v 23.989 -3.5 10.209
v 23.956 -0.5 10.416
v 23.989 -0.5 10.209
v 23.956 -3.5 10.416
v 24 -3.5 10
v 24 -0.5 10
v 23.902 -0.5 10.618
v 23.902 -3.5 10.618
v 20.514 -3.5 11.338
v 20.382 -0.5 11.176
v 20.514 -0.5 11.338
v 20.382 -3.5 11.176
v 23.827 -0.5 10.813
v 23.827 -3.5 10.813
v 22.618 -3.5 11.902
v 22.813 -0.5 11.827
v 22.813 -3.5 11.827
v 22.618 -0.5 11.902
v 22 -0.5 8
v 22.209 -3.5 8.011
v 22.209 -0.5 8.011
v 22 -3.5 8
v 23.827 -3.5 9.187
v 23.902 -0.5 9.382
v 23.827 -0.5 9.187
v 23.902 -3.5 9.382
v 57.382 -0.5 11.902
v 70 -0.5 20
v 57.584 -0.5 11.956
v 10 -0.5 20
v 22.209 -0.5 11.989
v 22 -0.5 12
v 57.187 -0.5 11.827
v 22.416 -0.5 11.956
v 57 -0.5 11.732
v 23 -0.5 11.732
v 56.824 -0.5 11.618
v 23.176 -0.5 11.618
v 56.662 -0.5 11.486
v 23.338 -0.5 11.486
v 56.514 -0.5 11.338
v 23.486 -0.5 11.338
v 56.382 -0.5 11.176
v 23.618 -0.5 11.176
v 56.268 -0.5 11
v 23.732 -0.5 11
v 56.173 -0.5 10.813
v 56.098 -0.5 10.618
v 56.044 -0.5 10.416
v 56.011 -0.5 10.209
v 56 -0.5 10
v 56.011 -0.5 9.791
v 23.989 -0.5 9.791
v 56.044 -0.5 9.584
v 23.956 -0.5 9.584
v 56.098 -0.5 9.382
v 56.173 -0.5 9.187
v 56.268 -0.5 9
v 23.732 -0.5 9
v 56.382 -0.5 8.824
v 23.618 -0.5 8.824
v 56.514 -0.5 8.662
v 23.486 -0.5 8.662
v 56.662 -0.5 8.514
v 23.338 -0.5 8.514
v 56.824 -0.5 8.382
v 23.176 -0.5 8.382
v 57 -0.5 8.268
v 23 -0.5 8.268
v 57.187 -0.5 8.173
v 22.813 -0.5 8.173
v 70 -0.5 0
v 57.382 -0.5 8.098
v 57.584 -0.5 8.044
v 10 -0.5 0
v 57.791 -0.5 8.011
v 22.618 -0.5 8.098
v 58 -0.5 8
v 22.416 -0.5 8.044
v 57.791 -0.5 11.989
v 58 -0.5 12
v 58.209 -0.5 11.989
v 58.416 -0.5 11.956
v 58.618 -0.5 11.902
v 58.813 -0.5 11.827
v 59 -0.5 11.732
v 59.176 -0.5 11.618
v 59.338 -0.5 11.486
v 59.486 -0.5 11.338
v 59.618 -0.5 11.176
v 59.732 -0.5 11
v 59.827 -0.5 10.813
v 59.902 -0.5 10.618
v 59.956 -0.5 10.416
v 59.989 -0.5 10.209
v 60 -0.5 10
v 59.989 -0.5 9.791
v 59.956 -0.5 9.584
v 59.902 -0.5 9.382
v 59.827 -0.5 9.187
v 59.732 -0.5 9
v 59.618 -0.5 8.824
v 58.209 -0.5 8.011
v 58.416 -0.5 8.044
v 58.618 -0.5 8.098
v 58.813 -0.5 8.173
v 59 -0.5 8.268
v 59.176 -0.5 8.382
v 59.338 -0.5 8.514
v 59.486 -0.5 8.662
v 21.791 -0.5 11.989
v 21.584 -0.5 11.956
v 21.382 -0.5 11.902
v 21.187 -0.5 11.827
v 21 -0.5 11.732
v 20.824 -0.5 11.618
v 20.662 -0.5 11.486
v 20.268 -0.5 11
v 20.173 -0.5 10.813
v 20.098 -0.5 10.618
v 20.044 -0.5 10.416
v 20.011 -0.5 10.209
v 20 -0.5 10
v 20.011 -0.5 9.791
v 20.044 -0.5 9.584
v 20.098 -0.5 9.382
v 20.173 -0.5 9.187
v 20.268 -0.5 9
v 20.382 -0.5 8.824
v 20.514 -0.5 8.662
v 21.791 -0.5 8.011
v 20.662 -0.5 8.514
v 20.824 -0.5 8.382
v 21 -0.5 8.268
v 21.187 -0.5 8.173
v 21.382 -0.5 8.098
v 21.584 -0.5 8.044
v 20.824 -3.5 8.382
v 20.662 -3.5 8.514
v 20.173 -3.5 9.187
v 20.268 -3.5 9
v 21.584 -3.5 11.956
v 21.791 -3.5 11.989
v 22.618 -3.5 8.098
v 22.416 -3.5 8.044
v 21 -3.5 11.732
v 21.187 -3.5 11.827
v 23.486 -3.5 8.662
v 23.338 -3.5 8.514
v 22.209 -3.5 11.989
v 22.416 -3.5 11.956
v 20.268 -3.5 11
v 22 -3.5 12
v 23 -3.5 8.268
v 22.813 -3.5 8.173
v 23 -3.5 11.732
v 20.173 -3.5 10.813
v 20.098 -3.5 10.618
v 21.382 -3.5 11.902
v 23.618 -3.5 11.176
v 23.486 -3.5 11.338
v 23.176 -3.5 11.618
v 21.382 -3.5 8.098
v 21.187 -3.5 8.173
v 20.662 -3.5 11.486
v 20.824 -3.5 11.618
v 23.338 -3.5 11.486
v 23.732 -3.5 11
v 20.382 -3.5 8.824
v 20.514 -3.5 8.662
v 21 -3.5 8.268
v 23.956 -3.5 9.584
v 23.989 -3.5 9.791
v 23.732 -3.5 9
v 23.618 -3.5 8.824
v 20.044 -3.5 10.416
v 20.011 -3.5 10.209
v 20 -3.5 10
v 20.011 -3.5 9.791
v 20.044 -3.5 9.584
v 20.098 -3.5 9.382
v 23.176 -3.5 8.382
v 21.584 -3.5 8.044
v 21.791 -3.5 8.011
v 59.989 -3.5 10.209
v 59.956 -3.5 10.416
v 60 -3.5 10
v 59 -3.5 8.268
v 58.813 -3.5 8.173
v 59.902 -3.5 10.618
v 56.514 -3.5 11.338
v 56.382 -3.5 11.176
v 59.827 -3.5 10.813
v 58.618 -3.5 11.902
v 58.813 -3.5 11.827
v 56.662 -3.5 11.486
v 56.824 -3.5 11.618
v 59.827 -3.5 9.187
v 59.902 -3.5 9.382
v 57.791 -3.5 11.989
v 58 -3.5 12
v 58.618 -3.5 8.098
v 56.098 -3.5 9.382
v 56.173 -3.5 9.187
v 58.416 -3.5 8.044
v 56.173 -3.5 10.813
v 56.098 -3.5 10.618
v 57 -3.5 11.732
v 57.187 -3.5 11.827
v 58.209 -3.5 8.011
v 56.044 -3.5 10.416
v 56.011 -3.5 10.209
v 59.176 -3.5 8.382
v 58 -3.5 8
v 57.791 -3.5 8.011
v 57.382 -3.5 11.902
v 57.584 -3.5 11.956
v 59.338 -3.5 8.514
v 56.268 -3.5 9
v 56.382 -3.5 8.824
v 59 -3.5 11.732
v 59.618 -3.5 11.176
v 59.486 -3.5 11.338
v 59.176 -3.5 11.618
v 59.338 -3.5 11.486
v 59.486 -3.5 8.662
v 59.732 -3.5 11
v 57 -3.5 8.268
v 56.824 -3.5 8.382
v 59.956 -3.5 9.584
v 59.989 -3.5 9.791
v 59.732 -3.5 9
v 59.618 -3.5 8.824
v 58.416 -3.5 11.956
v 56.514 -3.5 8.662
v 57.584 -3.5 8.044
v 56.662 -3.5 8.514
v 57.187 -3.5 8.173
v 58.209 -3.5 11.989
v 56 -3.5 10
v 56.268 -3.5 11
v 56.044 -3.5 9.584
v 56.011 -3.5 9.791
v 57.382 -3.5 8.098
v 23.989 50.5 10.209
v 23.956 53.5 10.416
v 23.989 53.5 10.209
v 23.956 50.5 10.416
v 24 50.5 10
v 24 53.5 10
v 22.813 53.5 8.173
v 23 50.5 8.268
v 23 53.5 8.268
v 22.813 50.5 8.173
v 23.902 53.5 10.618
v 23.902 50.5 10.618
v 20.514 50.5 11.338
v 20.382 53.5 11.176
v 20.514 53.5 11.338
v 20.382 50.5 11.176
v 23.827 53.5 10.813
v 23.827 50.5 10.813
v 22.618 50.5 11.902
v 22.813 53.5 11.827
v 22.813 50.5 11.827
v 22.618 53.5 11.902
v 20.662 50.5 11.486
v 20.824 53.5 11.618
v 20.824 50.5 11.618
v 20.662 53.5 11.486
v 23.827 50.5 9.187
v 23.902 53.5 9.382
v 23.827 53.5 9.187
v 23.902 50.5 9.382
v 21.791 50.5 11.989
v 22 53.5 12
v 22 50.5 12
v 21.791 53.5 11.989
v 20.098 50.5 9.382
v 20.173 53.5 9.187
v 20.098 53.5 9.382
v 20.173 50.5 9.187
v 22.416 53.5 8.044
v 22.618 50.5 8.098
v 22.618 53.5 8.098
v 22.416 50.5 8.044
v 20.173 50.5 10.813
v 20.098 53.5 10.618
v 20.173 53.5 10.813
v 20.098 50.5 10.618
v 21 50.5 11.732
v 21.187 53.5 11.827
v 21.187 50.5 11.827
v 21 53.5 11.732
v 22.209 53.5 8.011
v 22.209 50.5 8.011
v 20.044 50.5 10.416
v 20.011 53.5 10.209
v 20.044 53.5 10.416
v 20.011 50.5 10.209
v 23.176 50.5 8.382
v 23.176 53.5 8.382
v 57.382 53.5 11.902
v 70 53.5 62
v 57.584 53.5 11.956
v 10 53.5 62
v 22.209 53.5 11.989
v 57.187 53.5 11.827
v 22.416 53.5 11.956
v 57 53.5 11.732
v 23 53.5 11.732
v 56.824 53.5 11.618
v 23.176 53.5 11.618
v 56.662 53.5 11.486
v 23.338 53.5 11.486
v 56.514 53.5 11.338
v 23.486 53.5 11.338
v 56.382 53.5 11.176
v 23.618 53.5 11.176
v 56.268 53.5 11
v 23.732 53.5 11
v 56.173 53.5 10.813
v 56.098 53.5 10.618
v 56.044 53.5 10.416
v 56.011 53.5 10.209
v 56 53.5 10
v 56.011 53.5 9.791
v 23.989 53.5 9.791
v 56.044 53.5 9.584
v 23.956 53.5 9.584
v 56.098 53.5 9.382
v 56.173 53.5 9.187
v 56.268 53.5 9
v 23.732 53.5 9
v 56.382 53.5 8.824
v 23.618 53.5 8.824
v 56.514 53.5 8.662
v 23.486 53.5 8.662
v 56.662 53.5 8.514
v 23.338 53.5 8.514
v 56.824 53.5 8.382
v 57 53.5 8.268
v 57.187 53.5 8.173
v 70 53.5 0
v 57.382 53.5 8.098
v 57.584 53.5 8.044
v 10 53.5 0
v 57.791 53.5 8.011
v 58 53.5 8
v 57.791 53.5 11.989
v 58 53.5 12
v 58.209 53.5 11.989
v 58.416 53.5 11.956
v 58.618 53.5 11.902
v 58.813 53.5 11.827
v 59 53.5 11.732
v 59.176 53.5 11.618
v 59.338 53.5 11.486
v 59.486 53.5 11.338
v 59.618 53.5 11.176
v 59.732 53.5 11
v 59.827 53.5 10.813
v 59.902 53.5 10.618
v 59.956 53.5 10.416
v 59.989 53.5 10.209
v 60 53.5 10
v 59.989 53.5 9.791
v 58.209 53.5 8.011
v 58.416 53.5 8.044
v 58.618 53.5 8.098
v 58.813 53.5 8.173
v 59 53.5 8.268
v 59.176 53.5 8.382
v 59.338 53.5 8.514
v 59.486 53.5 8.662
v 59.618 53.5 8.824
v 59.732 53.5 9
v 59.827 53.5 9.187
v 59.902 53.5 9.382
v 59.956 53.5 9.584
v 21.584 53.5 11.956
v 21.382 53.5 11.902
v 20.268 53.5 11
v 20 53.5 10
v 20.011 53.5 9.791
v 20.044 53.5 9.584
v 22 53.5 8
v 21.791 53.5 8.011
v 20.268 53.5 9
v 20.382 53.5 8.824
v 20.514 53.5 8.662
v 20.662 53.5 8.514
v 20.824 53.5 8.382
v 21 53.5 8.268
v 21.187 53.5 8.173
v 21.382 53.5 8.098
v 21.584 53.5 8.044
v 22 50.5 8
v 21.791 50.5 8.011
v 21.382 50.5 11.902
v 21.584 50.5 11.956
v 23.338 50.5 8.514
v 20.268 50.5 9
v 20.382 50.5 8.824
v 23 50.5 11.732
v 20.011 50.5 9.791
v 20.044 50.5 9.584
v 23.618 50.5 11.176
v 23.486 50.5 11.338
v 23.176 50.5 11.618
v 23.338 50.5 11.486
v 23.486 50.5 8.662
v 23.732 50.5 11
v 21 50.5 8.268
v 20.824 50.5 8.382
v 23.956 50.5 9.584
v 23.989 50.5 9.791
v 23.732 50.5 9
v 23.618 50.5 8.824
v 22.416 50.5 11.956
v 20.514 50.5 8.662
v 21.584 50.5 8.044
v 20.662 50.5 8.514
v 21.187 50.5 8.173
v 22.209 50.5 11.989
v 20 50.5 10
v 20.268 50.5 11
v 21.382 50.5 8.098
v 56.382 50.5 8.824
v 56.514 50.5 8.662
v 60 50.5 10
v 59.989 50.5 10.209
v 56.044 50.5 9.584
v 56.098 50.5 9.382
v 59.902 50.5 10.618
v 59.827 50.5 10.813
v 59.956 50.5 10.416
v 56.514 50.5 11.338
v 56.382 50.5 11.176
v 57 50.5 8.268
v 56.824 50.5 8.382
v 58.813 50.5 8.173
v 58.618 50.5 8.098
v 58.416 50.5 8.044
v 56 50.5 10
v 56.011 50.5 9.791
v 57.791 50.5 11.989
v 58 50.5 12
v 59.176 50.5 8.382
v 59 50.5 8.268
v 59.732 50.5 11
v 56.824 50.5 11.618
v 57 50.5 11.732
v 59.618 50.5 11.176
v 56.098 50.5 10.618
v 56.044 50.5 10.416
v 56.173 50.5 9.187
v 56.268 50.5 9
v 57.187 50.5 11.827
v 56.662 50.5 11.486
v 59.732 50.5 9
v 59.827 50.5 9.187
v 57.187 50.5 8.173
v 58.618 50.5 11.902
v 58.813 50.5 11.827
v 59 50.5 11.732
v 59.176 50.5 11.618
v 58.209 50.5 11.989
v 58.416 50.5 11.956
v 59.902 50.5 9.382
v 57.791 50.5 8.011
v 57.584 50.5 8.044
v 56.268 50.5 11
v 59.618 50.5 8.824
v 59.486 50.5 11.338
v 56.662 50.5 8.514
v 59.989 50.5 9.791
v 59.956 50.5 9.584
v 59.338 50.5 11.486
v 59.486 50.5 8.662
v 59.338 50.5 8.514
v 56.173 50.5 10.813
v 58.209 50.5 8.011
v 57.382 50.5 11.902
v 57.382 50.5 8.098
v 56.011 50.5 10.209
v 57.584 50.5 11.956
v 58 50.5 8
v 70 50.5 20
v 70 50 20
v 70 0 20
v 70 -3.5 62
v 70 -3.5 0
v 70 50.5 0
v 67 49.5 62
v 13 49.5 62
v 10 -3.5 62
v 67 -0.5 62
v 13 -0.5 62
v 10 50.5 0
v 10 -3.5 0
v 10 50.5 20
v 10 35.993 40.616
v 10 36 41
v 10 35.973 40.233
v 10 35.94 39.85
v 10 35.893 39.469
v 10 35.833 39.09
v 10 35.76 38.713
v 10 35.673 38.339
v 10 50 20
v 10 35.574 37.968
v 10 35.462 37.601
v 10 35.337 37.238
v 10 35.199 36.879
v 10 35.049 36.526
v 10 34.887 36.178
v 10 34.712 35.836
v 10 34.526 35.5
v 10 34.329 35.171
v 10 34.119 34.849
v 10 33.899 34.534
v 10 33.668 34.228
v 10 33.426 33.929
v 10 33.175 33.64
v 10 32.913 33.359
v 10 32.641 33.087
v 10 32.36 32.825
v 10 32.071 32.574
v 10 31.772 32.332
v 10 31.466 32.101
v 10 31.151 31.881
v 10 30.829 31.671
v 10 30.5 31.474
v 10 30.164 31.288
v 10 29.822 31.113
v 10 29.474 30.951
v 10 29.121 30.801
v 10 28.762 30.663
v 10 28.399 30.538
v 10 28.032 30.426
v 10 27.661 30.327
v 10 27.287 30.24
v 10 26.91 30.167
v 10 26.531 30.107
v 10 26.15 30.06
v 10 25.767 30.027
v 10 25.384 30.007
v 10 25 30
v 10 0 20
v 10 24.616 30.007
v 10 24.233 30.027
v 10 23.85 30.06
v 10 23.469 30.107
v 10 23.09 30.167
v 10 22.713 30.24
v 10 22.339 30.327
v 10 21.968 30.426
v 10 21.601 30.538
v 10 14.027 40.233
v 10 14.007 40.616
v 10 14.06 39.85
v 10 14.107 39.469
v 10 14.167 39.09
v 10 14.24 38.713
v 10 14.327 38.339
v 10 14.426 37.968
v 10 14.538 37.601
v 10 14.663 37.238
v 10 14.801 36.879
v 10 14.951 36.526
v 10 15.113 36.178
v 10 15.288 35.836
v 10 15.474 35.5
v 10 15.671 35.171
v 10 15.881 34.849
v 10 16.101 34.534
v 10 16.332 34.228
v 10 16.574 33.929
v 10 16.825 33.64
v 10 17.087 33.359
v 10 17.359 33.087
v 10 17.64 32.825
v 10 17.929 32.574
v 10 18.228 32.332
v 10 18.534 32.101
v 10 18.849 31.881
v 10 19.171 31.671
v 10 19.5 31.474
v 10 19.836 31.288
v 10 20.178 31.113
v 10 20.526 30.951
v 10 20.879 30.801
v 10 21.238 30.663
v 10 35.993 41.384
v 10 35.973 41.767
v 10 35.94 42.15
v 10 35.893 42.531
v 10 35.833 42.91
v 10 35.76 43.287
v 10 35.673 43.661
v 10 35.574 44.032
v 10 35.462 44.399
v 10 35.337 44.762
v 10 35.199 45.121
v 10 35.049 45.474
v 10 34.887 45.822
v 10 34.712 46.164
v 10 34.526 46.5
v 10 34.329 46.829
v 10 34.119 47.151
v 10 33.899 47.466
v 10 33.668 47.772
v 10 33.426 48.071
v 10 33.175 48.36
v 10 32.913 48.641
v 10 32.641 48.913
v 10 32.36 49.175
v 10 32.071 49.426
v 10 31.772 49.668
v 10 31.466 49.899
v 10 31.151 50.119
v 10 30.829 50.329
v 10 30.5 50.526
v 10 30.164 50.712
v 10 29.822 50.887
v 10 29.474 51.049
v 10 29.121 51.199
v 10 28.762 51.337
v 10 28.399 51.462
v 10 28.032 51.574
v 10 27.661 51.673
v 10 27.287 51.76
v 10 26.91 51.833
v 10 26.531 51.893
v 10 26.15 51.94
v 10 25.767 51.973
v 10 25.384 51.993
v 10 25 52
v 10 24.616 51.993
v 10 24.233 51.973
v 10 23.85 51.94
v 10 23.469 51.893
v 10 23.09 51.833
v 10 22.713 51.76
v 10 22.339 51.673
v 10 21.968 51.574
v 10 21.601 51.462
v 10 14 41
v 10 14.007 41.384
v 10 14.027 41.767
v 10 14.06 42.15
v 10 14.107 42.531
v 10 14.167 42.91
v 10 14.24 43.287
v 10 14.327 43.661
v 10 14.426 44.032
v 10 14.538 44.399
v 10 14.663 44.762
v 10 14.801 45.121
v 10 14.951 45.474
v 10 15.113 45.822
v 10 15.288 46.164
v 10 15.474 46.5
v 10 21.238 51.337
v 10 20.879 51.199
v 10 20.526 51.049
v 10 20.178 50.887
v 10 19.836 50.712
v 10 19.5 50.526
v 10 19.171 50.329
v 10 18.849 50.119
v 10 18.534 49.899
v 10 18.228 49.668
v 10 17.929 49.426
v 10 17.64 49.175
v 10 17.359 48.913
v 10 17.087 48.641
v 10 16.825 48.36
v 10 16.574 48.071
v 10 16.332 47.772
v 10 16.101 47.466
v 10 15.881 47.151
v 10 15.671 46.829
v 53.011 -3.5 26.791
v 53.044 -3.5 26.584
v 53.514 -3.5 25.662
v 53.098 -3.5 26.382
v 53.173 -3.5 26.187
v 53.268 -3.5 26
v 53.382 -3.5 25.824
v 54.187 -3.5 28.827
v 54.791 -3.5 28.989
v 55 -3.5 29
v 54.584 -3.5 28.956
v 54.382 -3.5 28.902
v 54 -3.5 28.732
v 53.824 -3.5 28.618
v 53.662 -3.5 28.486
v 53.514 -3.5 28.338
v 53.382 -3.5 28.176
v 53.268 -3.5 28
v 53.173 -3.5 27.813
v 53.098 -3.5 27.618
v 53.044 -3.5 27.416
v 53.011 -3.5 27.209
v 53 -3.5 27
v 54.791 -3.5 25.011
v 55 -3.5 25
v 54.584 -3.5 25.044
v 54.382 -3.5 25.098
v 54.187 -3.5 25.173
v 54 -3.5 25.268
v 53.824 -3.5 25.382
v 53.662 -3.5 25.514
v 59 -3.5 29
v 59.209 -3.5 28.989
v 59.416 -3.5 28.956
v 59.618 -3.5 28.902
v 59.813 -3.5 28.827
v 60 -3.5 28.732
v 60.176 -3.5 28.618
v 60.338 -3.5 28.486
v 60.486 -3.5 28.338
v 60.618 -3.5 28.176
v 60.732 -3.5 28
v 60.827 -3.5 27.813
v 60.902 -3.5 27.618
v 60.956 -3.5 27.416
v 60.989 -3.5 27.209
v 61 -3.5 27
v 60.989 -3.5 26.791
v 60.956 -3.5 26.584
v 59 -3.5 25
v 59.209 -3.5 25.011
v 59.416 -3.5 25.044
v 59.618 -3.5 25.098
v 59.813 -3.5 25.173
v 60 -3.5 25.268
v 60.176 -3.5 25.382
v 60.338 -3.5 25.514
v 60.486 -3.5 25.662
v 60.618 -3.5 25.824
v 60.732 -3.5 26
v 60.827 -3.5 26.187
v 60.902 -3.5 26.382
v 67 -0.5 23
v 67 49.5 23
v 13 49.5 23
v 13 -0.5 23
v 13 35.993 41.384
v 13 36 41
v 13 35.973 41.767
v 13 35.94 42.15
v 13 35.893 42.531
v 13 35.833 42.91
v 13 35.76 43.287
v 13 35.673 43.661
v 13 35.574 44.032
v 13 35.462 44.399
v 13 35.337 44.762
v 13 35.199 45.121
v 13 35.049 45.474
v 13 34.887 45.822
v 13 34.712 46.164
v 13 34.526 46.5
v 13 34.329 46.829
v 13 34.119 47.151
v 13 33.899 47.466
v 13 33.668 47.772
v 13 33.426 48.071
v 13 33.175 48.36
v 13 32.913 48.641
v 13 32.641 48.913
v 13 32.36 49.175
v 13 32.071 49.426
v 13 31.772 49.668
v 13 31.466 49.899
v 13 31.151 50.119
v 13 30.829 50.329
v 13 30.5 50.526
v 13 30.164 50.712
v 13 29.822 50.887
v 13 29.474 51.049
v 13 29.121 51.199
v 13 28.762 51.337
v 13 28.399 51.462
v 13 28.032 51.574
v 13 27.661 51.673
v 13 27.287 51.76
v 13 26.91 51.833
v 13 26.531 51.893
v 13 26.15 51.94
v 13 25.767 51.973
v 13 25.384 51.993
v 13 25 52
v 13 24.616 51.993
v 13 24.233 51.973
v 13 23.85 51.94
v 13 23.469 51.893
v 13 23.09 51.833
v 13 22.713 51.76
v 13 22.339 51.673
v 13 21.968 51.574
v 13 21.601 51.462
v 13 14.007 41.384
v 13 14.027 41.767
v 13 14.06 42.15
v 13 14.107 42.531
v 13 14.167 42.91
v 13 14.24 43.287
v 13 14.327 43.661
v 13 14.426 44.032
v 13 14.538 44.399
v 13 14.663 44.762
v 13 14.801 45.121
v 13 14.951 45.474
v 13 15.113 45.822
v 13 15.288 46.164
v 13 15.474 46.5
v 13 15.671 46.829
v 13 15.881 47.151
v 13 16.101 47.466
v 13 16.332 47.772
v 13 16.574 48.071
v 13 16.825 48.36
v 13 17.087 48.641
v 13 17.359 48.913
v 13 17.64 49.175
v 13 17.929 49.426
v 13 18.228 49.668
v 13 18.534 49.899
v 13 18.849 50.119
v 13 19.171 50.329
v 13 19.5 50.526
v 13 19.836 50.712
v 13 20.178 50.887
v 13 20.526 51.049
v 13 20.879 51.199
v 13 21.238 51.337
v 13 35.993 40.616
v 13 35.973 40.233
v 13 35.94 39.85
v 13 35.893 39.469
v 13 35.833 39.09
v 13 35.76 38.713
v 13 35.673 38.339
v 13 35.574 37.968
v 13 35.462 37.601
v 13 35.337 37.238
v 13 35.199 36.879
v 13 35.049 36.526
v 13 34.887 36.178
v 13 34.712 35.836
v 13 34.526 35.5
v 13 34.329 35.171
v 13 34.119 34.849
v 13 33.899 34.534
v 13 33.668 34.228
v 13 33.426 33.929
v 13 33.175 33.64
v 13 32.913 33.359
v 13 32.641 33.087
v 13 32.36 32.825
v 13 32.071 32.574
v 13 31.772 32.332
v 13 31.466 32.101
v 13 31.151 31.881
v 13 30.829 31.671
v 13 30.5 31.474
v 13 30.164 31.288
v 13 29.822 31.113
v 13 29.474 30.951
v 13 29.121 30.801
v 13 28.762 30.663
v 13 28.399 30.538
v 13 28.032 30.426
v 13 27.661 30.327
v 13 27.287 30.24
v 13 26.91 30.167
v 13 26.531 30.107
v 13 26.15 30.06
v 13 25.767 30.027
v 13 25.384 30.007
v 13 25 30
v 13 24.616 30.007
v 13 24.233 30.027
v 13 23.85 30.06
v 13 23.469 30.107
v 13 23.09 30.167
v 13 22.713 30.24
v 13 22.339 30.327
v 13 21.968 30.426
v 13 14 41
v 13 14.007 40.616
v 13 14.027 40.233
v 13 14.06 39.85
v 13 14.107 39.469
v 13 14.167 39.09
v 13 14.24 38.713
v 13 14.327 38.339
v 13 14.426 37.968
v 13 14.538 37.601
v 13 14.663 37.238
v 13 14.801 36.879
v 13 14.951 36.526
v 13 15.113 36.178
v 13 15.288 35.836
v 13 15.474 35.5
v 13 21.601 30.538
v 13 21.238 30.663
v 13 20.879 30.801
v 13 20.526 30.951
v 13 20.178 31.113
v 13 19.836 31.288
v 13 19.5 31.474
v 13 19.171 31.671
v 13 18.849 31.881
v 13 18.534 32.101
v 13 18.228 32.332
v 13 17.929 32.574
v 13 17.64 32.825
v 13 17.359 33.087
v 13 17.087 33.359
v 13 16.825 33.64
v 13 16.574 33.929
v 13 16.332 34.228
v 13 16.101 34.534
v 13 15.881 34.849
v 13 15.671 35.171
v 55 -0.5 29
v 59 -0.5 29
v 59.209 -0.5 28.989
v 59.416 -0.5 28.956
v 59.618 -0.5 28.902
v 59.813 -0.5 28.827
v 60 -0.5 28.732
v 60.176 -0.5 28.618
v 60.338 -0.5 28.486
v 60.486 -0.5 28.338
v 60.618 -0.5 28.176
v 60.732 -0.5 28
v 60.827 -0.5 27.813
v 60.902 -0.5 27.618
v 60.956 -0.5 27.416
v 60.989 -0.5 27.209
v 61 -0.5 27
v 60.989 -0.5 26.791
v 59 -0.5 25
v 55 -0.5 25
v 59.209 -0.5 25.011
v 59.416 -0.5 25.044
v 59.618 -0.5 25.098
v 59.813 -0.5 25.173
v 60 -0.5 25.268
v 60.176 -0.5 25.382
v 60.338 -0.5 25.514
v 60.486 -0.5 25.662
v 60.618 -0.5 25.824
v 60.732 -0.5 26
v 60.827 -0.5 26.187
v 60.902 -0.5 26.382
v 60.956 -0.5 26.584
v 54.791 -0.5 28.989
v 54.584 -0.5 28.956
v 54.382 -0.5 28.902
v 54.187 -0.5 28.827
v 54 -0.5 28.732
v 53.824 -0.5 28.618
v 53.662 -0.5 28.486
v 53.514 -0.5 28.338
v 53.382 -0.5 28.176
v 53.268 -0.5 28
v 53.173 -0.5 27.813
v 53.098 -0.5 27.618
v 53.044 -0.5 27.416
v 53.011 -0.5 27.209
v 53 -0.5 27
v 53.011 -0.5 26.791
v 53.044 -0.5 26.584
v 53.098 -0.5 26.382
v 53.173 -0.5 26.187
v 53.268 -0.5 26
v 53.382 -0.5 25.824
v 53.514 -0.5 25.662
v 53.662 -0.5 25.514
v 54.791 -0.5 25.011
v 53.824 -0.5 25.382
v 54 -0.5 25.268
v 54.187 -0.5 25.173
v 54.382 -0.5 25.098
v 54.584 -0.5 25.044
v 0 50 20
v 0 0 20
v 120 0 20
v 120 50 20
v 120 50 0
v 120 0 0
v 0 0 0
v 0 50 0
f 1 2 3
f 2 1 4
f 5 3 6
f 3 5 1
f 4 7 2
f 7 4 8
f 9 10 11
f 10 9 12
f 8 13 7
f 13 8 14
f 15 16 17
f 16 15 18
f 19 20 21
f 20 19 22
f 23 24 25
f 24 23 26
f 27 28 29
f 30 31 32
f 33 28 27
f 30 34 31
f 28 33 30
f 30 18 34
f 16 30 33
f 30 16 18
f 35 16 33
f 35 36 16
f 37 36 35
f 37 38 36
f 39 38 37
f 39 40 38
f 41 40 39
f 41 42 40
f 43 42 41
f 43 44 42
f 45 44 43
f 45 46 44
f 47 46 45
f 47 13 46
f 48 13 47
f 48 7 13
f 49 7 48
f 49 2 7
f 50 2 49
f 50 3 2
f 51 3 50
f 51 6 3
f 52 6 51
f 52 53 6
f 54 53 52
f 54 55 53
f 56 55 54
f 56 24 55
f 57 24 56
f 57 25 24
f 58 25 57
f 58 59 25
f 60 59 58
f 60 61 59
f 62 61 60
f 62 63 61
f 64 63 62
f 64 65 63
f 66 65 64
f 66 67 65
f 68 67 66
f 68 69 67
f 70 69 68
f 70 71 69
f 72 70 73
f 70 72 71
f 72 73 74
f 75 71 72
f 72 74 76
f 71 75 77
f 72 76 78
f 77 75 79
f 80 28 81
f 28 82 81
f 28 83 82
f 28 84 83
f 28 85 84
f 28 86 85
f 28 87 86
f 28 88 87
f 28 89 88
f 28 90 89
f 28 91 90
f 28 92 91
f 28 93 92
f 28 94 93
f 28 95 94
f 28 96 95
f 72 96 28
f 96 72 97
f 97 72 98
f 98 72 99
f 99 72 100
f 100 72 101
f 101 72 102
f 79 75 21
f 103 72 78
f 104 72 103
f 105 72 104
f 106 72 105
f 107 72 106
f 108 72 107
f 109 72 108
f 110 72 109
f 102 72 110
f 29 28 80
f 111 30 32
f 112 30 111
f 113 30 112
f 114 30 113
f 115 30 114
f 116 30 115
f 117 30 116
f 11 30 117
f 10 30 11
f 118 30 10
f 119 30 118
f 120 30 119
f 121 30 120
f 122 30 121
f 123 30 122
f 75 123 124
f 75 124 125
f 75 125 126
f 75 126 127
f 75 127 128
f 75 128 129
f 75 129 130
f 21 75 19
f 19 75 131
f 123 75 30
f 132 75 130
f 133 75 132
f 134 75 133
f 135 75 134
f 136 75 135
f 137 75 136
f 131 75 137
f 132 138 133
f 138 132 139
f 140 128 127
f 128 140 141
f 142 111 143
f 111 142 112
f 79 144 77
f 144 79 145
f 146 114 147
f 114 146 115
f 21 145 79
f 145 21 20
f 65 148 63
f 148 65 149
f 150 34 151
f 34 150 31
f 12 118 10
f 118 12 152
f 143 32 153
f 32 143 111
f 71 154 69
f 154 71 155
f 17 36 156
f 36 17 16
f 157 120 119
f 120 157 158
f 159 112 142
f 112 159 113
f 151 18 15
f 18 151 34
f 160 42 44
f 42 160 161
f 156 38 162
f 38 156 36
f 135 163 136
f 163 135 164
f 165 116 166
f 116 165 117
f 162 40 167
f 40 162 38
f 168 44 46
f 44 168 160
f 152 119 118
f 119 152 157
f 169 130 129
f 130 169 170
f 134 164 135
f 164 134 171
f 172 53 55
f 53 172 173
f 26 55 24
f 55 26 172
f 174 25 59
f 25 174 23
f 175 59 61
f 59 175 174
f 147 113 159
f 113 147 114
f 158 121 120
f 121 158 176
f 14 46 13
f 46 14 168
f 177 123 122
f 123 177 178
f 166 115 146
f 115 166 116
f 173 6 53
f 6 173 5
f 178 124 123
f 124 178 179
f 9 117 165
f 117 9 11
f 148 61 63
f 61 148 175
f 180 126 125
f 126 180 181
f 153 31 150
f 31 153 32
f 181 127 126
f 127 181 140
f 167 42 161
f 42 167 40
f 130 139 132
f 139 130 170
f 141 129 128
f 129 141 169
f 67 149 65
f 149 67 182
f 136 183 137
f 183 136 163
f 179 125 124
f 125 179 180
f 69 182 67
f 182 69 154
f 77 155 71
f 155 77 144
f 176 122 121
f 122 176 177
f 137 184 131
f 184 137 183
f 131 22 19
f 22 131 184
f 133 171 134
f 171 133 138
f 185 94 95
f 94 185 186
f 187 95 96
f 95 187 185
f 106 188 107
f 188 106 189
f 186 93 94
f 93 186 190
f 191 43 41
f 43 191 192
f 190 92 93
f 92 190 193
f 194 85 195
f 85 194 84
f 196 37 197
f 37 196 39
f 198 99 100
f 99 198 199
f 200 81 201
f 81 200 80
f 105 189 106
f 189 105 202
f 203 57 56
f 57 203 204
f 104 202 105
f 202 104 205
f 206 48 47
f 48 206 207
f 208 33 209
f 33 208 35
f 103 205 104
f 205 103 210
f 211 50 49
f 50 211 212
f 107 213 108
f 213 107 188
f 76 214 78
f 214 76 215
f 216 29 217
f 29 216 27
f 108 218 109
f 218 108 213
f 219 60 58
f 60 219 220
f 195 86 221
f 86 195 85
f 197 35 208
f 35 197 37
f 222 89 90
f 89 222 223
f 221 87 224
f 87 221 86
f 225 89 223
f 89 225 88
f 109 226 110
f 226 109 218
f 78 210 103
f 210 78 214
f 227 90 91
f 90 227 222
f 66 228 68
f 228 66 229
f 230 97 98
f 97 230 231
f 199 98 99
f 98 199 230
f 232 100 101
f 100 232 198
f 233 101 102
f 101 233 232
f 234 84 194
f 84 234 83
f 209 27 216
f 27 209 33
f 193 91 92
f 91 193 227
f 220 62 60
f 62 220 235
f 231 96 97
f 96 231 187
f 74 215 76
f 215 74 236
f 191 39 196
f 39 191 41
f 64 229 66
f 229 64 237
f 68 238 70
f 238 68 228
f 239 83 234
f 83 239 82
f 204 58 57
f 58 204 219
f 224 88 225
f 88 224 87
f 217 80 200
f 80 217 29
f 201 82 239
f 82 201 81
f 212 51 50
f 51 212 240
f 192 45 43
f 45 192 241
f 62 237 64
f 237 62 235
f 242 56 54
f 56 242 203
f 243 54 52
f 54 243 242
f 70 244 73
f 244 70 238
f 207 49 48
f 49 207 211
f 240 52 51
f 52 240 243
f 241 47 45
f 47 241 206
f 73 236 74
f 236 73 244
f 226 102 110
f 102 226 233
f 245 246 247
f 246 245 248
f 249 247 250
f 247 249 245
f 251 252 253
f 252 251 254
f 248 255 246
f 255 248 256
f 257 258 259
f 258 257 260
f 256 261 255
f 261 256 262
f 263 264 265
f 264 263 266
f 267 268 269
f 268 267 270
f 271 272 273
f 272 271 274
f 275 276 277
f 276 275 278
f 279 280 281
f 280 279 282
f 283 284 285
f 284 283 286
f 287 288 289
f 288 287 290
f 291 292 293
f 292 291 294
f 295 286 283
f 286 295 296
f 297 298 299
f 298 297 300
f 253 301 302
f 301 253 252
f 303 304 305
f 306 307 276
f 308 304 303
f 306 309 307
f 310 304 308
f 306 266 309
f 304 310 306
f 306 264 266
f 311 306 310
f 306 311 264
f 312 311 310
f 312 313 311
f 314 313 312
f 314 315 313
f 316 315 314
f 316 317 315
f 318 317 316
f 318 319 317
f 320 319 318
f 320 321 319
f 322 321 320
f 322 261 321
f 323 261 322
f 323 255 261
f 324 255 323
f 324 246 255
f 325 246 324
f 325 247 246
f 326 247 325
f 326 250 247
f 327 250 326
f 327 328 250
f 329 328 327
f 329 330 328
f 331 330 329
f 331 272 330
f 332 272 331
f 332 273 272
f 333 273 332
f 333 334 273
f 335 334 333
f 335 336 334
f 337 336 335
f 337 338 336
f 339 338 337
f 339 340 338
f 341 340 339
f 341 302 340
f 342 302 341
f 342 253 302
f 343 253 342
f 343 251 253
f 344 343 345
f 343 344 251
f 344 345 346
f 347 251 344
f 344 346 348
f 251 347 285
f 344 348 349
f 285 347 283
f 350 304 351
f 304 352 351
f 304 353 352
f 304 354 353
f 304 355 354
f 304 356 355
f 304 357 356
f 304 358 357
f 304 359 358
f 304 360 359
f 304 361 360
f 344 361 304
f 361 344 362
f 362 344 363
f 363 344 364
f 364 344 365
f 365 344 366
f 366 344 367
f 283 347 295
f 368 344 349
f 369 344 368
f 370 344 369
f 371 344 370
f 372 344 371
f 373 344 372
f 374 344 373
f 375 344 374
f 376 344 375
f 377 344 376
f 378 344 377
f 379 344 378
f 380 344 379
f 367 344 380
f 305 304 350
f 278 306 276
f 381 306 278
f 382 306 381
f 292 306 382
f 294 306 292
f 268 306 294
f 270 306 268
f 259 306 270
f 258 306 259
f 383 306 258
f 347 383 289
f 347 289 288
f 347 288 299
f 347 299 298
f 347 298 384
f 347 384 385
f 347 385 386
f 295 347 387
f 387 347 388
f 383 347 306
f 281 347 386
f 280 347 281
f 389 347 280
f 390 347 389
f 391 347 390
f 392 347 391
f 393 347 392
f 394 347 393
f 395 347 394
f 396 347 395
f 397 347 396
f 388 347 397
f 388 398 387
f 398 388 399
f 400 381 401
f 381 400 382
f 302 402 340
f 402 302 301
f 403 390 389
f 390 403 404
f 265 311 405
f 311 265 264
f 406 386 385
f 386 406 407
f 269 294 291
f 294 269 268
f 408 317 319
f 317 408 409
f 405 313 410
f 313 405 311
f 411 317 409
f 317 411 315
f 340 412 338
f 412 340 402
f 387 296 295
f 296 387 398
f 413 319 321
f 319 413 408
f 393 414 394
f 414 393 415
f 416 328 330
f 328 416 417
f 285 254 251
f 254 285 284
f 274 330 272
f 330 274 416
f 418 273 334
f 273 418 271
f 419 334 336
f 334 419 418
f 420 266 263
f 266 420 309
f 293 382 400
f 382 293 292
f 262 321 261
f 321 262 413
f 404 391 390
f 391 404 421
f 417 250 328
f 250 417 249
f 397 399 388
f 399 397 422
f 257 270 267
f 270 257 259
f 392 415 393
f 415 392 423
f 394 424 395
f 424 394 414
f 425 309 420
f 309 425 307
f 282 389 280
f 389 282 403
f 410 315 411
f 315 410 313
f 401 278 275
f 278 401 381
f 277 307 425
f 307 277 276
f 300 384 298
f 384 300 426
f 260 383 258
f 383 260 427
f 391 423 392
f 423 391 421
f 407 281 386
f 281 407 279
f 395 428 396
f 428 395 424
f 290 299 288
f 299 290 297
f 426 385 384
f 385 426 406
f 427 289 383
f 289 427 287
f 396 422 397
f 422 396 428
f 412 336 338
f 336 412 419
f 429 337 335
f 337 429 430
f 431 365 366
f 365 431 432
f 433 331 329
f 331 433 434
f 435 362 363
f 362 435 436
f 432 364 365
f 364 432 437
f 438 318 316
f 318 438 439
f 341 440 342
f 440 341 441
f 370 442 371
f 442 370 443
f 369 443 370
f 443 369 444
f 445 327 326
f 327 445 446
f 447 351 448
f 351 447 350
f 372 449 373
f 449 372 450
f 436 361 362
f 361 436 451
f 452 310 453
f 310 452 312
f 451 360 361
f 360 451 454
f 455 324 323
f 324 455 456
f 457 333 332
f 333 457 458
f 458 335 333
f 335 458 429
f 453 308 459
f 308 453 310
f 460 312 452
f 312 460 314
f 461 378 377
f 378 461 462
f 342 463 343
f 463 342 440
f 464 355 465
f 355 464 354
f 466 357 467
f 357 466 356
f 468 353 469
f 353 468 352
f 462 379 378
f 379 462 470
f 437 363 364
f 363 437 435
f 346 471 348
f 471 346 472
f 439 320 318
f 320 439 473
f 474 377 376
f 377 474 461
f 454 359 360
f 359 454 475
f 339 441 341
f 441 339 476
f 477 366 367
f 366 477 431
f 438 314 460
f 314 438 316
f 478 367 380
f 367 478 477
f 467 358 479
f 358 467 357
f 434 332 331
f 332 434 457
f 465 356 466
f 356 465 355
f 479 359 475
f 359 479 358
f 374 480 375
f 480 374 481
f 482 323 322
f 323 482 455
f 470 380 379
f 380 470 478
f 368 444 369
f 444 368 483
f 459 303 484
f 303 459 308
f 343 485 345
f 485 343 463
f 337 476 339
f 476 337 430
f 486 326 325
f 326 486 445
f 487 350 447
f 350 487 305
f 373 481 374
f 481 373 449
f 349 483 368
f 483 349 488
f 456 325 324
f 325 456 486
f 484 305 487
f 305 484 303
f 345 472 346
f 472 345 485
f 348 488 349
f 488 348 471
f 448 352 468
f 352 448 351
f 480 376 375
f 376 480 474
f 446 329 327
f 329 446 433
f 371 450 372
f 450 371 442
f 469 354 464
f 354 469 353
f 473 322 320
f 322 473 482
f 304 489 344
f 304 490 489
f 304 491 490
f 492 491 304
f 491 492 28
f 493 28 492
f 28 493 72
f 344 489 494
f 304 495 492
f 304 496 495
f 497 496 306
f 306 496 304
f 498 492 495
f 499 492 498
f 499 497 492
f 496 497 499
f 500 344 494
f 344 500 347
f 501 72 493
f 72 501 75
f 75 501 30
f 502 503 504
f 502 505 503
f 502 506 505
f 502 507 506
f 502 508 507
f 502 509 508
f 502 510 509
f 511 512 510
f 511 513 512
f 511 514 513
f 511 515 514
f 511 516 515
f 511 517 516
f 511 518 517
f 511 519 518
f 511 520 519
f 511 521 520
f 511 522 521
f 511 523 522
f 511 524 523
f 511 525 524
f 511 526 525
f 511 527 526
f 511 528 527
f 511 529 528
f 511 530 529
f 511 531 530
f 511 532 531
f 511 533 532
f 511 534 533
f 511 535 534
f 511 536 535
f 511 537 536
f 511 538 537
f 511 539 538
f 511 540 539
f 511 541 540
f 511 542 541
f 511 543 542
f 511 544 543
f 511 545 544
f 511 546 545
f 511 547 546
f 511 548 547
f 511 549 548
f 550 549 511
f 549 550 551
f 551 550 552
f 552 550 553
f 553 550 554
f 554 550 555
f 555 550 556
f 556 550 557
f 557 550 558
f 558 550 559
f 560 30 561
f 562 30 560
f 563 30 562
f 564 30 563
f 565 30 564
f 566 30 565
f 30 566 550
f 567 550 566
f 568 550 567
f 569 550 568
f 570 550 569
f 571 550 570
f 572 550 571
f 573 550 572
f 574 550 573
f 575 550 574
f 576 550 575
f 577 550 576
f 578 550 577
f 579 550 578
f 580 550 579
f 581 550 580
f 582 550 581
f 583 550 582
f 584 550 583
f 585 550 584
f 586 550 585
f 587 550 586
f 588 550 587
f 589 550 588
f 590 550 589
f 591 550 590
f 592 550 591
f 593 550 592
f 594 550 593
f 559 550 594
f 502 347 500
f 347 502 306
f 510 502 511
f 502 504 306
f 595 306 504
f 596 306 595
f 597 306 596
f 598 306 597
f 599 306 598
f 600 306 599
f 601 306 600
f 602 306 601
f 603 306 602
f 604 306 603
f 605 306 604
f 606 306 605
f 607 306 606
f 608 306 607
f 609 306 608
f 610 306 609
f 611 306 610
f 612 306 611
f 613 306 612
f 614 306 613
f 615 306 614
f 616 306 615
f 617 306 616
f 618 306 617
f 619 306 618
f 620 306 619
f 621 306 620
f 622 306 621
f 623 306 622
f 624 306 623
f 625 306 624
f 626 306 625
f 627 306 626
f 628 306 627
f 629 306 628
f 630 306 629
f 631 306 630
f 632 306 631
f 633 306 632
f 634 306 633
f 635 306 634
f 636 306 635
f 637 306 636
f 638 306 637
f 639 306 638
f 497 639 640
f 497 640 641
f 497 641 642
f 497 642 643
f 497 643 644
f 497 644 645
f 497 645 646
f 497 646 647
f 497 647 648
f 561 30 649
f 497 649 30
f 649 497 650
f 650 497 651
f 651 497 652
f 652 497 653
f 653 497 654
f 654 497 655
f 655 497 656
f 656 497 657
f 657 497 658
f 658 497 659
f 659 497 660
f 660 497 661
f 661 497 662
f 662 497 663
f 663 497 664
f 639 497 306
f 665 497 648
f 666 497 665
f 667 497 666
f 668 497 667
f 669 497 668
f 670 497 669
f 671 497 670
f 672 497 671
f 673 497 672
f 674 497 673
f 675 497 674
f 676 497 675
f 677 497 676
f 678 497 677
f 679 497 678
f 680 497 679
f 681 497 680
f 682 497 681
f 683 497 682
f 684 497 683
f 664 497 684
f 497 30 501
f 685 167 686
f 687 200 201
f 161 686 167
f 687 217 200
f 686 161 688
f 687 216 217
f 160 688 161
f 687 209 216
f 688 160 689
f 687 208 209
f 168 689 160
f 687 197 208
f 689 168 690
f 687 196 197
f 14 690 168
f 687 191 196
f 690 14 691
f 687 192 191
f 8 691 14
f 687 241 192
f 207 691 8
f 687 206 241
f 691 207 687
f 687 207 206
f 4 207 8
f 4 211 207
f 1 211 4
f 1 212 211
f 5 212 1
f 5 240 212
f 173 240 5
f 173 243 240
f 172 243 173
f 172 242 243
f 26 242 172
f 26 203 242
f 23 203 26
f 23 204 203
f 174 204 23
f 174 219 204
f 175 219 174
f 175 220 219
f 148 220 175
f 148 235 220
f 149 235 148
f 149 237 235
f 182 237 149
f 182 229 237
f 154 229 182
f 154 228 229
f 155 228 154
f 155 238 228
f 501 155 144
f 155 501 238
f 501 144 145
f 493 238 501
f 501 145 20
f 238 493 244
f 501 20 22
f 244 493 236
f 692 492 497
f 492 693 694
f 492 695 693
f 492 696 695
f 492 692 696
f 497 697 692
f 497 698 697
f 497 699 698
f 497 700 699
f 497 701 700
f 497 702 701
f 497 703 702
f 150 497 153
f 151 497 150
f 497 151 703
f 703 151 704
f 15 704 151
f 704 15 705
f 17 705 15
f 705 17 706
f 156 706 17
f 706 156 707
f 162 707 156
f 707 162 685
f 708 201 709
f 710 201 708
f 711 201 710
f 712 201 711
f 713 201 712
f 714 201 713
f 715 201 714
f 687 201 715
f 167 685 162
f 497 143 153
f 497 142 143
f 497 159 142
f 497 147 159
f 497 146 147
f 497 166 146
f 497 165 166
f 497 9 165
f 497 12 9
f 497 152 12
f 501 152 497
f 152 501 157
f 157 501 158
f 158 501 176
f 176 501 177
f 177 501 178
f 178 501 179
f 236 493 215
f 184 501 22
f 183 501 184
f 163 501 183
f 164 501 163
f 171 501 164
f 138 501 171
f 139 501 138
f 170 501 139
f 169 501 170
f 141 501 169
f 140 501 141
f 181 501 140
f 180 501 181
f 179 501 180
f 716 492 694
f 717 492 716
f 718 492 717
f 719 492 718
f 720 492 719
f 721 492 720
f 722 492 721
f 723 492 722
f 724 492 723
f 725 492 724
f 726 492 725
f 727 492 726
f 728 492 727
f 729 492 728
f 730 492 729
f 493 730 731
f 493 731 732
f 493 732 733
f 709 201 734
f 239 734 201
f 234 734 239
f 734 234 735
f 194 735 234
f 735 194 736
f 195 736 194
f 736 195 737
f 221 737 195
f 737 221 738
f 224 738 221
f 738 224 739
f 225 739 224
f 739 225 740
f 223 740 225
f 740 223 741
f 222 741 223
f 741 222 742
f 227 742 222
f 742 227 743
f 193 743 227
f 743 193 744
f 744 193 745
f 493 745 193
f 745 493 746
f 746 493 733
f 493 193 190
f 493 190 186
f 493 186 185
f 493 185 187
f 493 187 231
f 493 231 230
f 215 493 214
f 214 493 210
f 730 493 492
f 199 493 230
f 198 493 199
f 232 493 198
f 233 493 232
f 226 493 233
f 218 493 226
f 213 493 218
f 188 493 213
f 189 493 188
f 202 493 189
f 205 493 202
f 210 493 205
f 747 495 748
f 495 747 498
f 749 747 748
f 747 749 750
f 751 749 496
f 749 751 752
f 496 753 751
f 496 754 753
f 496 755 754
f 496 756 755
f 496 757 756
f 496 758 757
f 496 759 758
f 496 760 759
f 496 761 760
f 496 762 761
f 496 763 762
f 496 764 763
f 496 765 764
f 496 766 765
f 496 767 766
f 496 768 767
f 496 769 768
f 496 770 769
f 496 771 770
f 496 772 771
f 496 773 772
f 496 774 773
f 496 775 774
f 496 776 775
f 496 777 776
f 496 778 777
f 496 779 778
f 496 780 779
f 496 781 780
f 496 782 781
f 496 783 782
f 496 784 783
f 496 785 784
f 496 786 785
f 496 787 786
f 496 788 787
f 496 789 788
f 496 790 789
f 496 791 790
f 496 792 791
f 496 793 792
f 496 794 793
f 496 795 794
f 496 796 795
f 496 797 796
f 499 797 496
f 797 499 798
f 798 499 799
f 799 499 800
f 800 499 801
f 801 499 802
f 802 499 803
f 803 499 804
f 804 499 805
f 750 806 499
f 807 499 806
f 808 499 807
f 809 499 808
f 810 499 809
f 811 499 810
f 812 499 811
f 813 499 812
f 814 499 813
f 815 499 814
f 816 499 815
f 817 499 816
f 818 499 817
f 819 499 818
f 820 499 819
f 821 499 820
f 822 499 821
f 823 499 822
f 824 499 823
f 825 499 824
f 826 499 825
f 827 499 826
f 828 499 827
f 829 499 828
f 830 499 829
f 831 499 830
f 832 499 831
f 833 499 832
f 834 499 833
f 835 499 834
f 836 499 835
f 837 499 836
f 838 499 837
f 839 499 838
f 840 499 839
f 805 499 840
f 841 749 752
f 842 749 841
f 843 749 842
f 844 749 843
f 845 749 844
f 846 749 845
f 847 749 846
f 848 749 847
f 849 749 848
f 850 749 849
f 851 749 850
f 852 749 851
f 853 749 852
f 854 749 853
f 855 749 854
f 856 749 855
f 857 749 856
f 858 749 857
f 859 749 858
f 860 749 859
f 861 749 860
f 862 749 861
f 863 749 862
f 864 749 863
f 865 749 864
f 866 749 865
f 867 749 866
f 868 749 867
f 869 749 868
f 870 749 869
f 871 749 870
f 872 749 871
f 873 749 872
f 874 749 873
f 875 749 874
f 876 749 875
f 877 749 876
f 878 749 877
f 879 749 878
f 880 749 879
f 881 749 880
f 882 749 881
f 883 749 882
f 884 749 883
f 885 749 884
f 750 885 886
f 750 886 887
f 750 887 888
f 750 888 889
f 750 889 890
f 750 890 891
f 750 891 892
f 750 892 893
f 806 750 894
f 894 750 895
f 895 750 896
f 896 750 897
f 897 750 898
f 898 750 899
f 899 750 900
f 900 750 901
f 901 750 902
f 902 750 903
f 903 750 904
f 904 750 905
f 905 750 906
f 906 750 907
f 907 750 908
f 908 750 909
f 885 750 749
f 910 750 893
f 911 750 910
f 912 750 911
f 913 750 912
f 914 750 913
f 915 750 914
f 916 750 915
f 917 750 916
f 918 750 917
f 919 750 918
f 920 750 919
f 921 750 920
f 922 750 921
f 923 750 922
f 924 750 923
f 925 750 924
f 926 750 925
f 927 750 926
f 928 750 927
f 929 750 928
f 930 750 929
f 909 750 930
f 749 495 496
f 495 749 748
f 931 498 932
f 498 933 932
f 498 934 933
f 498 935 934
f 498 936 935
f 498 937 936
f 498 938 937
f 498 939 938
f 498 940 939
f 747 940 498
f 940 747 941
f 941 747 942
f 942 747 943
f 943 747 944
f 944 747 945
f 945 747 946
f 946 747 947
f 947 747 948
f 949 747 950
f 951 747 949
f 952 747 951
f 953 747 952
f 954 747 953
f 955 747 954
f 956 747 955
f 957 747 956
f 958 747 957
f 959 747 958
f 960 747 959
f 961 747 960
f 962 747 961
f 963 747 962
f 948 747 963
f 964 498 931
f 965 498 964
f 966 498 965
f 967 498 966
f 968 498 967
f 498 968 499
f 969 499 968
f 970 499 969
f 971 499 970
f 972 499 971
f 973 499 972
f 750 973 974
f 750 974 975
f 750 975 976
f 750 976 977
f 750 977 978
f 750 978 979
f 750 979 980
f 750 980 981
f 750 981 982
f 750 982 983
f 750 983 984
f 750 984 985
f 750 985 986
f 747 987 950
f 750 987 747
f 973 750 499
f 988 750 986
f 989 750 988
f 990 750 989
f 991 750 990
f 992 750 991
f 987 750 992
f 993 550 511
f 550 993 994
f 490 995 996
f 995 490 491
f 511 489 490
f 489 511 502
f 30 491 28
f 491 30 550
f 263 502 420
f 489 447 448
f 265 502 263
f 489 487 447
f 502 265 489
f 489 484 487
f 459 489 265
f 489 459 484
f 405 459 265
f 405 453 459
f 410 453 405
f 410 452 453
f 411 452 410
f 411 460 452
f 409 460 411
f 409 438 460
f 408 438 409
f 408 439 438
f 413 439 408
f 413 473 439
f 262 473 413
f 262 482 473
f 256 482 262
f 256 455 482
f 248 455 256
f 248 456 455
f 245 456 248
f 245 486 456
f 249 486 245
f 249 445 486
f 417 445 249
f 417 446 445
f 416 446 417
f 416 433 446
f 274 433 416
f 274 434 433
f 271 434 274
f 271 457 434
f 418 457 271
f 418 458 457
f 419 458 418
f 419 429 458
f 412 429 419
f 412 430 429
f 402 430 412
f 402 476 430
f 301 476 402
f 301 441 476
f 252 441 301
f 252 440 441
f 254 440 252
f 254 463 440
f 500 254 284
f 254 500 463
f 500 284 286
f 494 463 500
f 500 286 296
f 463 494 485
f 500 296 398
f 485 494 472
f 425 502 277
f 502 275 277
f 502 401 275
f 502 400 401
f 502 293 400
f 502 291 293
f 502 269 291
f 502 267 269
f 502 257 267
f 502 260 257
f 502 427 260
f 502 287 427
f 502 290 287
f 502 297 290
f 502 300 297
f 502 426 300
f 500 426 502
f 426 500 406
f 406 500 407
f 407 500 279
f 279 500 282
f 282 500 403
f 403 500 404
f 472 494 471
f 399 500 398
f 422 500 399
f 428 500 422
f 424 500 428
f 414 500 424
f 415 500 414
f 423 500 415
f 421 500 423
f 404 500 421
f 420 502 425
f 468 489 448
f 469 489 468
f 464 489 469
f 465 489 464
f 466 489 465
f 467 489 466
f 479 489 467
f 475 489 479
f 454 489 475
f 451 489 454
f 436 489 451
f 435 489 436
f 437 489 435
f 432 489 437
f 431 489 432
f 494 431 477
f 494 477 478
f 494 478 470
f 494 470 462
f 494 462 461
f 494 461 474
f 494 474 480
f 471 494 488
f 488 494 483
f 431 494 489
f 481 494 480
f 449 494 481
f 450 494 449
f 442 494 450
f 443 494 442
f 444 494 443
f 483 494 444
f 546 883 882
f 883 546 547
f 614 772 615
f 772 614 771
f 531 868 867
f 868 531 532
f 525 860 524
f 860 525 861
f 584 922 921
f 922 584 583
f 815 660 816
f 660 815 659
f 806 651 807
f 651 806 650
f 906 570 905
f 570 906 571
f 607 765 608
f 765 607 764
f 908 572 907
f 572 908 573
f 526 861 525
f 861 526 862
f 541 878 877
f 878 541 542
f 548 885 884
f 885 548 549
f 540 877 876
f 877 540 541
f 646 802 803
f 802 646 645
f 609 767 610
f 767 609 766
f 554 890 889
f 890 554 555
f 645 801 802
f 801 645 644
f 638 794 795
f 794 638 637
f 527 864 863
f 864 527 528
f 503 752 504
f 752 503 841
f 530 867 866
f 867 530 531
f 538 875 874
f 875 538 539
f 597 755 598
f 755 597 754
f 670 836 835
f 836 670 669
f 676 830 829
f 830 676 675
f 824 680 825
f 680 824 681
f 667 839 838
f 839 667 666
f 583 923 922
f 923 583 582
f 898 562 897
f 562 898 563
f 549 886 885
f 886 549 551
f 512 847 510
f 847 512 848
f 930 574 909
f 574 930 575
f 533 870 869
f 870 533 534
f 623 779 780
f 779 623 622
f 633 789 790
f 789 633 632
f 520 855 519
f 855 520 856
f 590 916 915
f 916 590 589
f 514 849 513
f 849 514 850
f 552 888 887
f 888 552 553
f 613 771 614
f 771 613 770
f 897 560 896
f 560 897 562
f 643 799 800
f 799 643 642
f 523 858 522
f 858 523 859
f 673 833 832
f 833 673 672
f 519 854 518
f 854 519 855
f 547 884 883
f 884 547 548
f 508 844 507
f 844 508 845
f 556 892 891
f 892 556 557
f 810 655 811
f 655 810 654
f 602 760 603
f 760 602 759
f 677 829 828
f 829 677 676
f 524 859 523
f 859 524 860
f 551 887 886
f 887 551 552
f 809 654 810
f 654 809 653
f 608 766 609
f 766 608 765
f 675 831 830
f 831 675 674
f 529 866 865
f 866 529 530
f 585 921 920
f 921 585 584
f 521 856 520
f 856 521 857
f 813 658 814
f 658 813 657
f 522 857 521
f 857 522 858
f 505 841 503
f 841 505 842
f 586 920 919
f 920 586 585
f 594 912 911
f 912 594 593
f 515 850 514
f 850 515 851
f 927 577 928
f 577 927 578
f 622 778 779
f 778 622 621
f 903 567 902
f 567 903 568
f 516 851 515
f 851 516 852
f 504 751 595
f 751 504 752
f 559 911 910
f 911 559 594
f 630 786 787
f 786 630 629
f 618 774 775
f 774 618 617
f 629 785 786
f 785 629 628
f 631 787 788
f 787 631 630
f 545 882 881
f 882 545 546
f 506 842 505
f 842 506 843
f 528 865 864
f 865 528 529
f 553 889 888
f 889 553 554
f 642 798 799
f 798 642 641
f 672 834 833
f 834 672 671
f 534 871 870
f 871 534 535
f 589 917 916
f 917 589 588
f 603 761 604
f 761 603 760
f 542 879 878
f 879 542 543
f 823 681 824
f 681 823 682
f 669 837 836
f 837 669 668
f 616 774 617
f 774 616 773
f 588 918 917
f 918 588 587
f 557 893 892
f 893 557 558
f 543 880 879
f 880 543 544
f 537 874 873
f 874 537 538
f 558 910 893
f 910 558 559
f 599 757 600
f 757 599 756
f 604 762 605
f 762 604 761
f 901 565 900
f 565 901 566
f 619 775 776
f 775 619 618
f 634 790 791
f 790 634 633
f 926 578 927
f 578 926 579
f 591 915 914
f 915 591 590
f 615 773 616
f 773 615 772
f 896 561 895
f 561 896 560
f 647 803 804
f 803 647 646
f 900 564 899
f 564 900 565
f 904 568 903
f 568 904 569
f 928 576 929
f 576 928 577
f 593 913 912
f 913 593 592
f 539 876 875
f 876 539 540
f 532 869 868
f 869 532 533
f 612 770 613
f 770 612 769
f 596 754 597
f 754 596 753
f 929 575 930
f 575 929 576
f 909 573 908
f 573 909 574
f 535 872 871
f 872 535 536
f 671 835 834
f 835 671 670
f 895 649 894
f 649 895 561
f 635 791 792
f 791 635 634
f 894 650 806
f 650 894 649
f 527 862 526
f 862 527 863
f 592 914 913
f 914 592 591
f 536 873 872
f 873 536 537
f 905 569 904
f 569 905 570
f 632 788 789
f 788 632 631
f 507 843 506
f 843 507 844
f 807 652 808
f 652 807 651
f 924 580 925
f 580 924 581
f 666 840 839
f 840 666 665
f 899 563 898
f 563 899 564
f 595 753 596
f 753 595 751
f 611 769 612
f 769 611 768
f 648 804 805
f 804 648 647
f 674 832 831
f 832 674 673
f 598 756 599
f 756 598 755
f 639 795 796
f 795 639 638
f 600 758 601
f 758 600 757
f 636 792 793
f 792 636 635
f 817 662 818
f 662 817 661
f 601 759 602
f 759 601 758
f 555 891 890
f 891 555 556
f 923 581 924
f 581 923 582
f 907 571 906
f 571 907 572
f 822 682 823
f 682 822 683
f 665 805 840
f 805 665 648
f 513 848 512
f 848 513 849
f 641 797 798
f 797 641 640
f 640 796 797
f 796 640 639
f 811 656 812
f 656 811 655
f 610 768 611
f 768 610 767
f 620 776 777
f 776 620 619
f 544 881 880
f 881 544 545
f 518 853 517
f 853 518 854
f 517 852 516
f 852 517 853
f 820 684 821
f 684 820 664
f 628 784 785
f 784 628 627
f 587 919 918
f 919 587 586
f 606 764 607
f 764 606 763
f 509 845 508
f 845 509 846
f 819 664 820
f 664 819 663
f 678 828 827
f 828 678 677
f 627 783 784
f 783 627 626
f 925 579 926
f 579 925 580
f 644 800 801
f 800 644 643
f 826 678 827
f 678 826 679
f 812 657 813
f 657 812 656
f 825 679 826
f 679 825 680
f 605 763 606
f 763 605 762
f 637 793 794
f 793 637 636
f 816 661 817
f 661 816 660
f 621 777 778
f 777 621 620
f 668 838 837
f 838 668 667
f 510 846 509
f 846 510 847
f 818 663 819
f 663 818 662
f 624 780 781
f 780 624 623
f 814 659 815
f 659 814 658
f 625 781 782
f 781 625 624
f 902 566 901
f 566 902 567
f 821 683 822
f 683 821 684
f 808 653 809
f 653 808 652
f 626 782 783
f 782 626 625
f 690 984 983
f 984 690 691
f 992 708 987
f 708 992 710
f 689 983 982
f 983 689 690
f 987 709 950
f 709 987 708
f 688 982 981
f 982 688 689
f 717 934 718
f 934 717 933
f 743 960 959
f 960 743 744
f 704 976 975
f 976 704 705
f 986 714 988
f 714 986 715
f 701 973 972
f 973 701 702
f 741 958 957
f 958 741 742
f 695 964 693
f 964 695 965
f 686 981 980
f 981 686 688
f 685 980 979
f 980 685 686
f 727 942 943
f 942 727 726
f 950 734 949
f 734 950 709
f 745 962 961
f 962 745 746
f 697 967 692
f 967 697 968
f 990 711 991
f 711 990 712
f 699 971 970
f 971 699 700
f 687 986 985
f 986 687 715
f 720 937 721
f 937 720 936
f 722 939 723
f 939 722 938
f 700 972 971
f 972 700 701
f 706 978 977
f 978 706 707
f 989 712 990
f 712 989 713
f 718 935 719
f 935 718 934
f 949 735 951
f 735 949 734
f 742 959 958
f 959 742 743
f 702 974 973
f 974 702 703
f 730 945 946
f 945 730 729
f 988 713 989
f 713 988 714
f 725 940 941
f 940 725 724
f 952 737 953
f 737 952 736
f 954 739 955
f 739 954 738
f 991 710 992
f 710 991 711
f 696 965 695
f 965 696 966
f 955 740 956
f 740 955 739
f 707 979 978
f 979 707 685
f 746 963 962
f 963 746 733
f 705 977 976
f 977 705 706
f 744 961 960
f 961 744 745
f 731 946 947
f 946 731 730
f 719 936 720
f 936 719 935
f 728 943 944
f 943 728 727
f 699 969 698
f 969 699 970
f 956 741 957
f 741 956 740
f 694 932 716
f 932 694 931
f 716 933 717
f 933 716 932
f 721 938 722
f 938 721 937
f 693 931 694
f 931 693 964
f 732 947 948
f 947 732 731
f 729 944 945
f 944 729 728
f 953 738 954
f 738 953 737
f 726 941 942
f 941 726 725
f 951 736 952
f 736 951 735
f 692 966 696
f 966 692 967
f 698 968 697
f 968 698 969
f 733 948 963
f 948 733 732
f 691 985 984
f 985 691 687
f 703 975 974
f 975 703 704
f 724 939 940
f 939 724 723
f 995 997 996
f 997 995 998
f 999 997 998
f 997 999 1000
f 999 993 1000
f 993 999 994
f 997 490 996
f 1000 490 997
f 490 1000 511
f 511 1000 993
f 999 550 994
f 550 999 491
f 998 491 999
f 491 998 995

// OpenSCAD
rail_width = 50;
rail_height = 20;
rail_length = 120;
rail_tolerance = 0.5;
wall_thickness = 3;
box_length = 60;
box_height = 42;
button_hole_diameter = 22;
screw_hole_diameter = 4;
screw_hole_offset = 12;
cable_hole_diameter = 4;
cable_hole_offset = 4;
lid_tolerance = 0.2;

module box_outer(){
    cube([
        box_length,
        rail_width + wall_thickness * 2 + rail_tolerance * 2,
        box_height + rail_height
    ]);
}

module rail_cutout(){
    translate([0, wall_thickness, 0]){
        cube([
            box_length,
            rail_width + rail_tolerance * 2,
            rail_height,
        ]);
    }
}

module box_inner_cutout(){
    translate([wall_thickness, wall_thickness, rail_height + wall_thickness]){
        cube([box_length - wall_thickness * 2, rail_width, box_height - wall_thickness]);
    }
}

module button_hole_cutout(){
    translate([0, rail_width / 2 + wall_thickness + rail_tolerance, rail_height + box_height / 2]){
        rotate([0, 90, 0]){
            cylinder(d=button_hole_diameter, h=wall_thickness, center=false, $fn=180);
        }
    }
}

module screw_hole(){
    translate([0, wall_thickness, 0]){
        rotate([90, 0, 0]){
            cylinder(d=screw_hole_diameter, h=wall_thickness + rail_tolerance, center=false, $fn=60);
        }
    }
}

module cable_hole(){
    translate([box_length - wall_thickness - cable_hole_offset - cable_hole_diameter * 2, 0, rail_height + wall_thickness + cable_hole_offset]){
        hull(){
            translate([0, wall_thickness, 0]){
                rotate([90, 0, 0]){
                    cylinder(d=screw_hole_diameter, h=wall_thickness + rail_tolerance, center=false, $fn=60);
                }
            }
            translate([cable_hole_diameter, wall_thickness, 0]){
                rotate([90, 0, 0]){
                    cylinder(d=screw_hole_diameter, h=wall_thickness + rail_tolerance, center=false, $fn=60);
                }
            }
        }
    }
}

module screw_holes(){
    translate([screw_hole_offset, 0, rail_height / 2]){
        screw_hole();
    }
    translate([box_length - screw_hole_offset, 0, rail_height / 2]){
        screw_hole();
    }
    translate([screw_hole_offset, rail_width + wall_thickness + rail_tolerance * 2, rail_height / 2]){
        screw_hole();
    }
    translate([box_length - screw_hole_offset, rail_width + wall_thickness + rail_tolerance * 2, rail_height / 2]){
        screw_hole();
    }
}

module lid(){
    union() {
        cube([
            box_length,
            rail_width + wall_thickness * 2 + rail_tolerance * 2,
            wall_thickness
    ]);
        translate([wall_thickness, wall_thickness + rail_tolerance, wall_thickness]){
            cube([
                box_length - wall_thickness * 2,
                rail_width,
                wall_thickness
            ]);
        }
    }
}

module rail(){
    color("white"){
        cube([
            rail_length,
            rail_width,
            rail_height,
        ]);
    }
}

module main(){
    translate([10, -wall_thickness-rail_tolerance, 0]){
        difference(){
            box_outer();
            box_inner_cutout();
            rail_cutout();
            button_hole_cutout();
            screw_holes();
            cable_hole();
        }
    }
    rail();
}


//lid();
main();
